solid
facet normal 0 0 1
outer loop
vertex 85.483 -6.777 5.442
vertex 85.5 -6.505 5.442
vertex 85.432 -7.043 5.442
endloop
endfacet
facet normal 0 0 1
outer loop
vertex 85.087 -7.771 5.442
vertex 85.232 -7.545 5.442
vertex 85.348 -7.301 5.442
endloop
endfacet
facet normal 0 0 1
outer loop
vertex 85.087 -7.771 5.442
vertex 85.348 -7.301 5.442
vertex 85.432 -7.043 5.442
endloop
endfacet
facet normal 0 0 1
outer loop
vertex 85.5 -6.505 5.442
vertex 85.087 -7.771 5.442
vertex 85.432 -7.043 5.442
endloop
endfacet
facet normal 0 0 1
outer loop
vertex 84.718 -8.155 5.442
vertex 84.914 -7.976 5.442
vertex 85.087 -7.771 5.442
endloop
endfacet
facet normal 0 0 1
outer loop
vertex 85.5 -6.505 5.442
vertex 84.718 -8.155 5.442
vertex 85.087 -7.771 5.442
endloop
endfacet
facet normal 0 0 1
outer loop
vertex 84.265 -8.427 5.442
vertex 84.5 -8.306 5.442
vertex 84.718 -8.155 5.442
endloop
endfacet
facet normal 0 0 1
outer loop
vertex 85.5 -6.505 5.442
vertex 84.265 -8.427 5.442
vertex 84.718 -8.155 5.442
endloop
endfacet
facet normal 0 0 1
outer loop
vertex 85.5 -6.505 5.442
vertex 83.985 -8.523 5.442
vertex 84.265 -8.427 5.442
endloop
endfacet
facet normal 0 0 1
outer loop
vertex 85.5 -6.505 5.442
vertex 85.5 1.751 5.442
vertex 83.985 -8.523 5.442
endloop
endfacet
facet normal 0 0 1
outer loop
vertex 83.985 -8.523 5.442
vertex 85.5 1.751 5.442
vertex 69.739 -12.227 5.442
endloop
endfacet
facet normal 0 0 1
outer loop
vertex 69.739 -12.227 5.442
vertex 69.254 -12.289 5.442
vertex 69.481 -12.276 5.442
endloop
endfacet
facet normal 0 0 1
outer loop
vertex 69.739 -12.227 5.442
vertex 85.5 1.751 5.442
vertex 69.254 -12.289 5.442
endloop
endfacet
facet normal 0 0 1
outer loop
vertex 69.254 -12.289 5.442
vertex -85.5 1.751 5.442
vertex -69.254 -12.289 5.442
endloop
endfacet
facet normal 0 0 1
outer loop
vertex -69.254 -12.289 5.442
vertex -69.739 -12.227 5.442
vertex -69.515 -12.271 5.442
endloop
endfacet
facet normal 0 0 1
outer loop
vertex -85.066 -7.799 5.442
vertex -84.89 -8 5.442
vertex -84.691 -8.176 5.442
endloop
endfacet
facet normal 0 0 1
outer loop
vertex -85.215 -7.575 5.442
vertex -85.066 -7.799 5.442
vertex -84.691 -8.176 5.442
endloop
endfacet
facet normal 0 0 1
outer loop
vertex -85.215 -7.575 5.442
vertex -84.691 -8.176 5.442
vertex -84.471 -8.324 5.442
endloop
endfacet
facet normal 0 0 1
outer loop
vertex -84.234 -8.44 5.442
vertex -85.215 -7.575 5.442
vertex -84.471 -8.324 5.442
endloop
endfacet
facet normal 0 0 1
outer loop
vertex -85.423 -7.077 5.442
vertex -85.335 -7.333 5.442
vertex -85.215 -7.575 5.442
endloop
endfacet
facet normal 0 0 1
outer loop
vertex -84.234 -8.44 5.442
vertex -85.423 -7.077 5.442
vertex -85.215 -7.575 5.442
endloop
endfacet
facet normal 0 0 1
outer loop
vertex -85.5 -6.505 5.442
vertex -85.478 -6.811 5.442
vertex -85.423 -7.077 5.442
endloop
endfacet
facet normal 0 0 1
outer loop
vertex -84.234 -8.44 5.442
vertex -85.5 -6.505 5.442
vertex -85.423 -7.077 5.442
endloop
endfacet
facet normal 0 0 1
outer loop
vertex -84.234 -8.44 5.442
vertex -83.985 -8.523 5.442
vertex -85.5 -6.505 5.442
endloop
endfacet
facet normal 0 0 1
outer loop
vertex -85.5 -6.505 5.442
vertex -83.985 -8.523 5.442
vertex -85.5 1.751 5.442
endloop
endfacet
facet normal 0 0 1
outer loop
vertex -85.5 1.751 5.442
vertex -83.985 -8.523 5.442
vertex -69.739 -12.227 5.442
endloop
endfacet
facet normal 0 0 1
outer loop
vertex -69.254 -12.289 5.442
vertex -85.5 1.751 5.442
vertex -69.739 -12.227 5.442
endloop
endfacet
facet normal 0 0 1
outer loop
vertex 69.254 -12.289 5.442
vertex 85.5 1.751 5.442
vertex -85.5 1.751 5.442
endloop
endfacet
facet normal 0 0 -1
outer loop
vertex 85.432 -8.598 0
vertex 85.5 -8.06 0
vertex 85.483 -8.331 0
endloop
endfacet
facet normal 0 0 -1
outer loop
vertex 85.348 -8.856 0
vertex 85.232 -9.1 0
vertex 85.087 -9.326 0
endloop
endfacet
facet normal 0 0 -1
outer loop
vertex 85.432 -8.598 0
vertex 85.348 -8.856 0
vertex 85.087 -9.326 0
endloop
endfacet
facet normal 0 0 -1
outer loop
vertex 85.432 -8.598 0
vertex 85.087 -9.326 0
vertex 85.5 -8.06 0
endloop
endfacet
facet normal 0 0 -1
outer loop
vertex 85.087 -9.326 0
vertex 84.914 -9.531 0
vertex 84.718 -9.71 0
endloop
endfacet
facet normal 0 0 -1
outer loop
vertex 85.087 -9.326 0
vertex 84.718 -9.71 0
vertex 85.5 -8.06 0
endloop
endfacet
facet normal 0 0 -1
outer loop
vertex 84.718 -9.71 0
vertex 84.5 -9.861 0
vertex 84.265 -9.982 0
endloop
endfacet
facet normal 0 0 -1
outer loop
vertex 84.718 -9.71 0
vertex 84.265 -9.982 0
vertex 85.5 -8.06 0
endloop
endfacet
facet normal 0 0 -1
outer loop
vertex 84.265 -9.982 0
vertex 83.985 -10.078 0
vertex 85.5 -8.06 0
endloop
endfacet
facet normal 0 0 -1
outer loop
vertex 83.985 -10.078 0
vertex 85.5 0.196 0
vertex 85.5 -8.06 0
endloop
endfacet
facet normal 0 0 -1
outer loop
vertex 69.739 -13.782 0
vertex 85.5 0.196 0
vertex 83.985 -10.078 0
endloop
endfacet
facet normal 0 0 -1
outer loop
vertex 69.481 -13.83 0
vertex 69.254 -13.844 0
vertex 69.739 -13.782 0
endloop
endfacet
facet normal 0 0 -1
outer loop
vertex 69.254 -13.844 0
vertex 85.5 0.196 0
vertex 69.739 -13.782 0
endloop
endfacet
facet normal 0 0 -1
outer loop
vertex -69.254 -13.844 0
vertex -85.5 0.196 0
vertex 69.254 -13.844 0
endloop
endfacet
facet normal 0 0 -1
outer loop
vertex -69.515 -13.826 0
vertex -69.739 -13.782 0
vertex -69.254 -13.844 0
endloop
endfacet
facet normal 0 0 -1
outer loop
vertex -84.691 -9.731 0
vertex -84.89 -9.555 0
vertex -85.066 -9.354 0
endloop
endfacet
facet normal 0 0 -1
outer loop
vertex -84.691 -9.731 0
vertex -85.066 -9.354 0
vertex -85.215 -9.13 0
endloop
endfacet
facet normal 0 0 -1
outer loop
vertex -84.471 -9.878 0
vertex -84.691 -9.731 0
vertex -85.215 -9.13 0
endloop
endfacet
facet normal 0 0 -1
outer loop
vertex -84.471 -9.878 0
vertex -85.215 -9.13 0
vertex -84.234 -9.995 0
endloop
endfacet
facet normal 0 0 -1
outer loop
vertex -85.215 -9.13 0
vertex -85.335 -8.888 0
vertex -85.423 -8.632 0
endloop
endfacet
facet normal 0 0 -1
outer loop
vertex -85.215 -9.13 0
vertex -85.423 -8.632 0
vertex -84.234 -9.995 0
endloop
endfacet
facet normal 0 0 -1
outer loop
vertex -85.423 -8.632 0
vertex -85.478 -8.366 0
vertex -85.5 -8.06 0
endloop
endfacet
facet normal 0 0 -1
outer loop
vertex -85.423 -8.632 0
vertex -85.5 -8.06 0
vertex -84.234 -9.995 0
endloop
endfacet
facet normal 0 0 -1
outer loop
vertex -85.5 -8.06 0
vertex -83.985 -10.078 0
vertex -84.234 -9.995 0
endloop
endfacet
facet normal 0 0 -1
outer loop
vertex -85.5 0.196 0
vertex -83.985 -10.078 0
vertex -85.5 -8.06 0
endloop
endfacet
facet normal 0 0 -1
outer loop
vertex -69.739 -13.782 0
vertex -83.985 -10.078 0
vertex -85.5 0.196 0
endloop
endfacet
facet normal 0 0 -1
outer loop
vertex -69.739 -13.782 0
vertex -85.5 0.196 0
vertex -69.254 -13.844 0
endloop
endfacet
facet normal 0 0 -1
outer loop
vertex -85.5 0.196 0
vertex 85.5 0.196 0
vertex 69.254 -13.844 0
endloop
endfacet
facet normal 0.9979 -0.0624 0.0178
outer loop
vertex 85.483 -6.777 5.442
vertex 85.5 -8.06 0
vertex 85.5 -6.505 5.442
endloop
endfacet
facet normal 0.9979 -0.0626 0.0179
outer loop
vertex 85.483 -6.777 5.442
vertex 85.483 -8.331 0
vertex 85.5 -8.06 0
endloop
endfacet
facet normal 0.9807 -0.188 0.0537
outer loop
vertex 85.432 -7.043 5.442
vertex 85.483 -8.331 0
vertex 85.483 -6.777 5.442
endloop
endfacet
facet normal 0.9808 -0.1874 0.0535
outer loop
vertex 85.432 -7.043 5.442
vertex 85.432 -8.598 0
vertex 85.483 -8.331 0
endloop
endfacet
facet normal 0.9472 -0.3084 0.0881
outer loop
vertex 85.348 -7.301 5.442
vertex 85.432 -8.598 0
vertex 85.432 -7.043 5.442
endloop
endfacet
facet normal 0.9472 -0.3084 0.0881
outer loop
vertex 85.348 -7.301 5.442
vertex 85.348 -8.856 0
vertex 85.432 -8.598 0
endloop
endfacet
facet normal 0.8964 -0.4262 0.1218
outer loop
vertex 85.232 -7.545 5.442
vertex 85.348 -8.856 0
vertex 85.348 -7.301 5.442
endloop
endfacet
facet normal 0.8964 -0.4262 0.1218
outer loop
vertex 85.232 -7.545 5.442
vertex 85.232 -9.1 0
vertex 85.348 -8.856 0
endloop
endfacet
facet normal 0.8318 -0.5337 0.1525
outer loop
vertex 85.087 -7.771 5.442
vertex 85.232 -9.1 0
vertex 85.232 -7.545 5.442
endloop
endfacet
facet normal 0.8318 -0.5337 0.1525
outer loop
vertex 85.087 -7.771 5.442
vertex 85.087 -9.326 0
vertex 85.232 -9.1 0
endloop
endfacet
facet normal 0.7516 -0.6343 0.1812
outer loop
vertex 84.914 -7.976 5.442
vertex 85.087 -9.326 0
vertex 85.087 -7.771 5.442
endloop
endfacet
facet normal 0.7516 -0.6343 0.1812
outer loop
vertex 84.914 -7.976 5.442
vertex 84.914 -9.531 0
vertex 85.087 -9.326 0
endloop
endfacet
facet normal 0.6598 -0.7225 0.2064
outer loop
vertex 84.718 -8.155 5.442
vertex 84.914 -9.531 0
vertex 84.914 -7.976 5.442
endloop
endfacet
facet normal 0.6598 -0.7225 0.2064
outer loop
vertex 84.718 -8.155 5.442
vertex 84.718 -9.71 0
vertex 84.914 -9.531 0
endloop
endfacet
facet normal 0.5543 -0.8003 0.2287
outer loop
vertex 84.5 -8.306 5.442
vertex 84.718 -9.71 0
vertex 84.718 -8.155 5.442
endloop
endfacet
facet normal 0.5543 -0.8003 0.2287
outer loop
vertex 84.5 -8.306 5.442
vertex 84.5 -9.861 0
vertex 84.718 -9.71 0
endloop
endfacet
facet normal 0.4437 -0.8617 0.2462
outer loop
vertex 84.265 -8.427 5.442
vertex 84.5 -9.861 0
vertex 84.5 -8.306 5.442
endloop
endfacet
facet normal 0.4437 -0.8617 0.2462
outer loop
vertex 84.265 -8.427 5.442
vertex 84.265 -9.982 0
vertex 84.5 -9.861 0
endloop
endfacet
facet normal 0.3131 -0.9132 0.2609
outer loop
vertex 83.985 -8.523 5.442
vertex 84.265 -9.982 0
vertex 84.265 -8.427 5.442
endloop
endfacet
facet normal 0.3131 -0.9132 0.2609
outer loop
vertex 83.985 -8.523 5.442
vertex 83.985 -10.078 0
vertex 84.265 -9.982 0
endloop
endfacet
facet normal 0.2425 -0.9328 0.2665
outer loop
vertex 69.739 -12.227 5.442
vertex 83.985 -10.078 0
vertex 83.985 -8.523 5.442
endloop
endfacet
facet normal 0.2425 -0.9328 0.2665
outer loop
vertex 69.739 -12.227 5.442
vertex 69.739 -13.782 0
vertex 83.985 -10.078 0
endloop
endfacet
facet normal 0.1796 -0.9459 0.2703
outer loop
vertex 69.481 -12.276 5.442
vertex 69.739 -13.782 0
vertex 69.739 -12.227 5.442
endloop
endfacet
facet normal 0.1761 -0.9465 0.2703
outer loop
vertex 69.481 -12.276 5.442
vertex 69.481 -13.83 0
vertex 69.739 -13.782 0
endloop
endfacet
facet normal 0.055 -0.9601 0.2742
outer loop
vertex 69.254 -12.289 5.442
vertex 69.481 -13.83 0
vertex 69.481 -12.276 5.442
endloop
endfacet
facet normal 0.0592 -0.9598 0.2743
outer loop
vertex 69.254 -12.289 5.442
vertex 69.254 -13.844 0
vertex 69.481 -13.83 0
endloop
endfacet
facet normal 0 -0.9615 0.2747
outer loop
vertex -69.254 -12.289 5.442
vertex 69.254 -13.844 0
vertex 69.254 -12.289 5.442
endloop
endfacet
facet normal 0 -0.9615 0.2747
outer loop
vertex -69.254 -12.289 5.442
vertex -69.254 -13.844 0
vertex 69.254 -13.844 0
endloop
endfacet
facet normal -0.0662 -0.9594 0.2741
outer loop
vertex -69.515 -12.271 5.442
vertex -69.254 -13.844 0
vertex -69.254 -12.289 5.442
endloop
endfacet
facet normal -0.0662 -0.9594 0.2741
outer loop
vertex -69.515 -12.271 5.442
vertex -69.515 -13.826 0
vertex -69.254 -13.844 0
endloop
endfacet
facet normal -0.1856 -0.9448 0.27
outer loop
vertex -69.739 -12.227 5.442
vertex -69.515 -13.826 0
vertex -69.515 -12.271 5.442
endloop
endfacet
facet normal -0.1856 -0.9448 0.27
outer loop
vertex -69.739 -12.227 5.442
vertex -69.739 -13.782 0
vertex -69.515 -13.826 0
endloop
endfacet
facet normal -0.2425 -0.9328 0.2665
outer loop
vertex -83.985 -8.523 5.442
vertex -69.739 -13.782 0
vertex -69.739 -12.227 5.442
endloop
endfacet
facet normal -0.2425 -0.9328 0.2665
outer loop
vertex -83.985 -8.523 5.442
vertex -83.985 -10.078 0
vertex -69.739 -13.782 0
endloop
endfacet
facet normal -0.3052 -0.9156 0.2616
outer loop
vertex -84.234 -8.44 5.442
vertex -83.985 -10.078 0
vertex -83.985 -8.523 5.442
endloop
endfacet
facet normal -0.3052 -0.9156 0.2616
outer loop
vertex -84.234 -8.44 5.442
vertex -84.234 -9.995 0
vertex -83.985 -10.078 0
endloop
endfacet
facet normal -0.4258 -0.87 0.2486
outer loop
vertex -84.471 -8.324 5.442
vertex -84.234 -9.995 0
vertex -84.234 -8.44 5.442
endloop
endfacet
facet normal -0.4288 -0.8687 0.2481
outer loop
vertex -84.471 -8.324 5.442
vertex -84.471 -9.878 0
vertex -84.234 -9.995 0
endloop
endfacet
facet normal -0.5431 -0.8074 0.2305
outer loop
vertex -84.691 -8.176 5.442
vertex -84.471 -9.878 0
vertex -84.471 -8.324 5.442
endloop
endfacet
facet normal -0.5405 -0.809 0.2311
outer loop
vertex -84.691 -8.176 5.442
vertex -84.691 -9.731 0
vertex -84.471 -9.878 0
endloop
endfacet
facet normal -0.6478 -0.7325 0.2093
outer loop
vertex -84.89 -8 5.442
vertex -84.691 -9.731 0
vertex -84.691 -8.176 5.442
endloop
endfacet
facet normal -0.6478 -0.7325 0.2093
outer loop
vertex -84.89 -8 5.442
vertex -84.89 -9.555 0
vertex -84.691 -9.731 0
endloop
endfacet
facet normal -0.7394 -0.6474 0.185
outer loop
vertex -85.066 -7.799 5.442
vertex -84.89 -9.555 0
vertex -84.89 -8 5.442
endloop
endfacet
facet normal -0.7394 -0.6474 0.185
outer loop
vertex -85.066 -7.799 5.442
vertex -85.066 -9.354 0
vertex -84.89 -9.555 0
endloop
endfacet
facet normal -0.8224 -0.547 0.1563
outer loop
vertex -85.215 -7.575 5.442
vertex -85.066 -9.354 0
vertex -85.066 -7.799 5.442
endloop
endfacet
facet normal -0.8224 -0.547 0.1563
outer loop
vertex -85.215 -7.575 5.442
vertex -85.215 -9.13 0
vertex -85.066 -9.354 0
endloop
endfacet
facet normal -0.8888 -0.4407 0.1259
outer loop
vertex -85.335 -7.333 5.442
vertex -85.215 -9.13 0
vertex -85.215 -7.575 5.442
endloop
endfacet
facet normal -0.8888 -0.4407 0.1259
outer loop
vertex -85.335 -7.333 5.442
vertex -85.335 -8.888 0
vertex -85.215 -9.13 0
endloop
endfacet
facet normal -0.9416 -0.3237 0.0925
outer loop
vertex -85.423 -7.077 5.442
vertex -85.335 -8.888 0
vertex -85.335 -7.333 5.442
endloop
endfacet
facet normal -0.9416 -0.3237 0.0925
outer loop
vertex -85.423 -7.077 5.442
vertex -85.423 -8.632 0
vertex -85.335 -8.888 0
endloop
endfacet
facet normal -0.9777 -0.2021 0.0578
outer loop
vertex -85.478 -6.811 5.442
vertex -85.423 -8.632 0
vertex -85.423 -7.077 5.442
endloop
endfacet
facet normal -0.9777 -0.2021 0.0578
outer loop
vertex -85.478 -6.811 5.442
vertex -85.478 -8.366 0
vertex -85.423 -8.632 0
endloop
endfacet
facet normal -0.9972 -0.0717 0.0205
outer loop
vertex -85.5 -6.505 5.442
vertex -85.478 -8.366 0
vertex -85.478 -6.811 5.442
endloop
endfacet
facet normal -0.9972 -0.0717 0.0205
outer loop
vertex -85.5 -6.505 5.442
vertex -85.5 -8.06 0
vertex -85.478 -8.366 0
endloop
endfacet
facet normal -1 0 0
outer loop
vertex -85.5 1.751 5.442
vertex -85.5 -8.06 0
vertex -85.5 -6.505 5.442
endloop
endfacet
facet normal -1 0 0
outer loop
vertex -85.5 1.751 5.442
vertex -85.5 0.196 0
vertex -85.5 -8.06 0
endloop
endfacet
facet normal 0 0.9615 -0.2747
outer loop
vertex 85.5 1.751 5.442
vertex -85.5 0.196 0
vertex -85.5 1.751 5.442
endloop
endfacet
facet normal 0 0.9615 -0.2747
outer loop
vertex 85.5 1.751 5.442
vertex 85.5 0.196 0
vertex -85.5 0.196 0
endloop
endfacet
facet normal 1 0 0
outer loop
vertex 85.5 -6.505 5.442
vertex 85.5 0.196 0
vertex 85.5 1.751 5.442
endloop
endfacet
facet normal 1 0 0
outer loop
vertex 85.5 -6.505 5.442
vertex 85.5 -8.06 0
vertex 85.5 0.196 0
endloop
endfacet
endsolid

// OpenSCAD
// ROG Bulwark Dock (DG310) back-wall shim for the 2023 ROG Ally (RC71L)
// The DG310 cradle is sized for the thicker 2025 model. This shim lines the
// cradle's back wall so the thinner RC71L sits snugly and stays upright.
//
// Coordinates: X = left/right (centered), Y = front/back (0 = bare back wall
// at floor level, +Y toward the front), Z = up.
// Measurements are entered as taken with the pad in place. Widths are to the
// bare plastic; depths from the back wall and heights from the floor are to
// the pad surface. The bare-plastic sizes are worked out below.
// Print orientation: by default the shim is exported lying flat on its back
// face, ready to print. Set print_flat = false to see it as it sits in the dock.

/* [Cradle] */
back_width    = 174;  // width of the back wall at the floor
floor_depth   = 28;   // padded back wall to padded front edge, at floor level

/* [Cradle back wall (front view)] */
wall_h_center = 14;   // wall height in the middle, from the padded floor
wall_h_end    = 10;   // wall height at the ends, from the padded floor
wall_chamfer  = 16;   // horizontal length of the corner slopes
wall_lean     = 4;    // how far the top of the wall leans back over its height
wall_corner_r = 2;    // radius of the rounded top corners (0 = sharp). Bigger is safe.

/* [Pad] */
// The sticky pad lines the cradle (floor, back, front and sides). The back
// pad is a separate piece: it can stay on the wall, or move to the shim's
// front face. Either way it takes up the same space, so the shim is the same.
pad_thickness = 1;

/* [Device] */
ally_depth = 21;      // RC71L thickness where it sits in the cradle

/* [Fit] */
clearance      = 0.5; // gap left at the ends and top so it drops in
fit_gap        = 0.5; // extra front-to-back room for the Ally
liner_override = 0;   // set >0 to force a shim thickness (mm)

/* [Output] */
print_flat = true;    // true = lying on its back face for printing

/* [Hidden] */
$fn = 48;
tilt  = wall_lean / wall_h_center;      // horizontal shift per mm of height
theta = atan(tilt);

// Bare-plastic sizes (measurements above were taken with the pad in place)
depth_bare = floor_depth + 2 * pad_thickness;  // back + front pads
h_ctr_bare = wall_h_center + pad_thickness;    // floor pad
h_end_bare = wall_h_end + pad_thickness;       // floor pad

// Floor, side and front pads stay in the cradle
pad_in = pad_thickness;

// Horizontal footprint of a leaning device of thickness ally_depth
ally_footprint = ally_depth / cos(theta);

// Depth to fill = bare floor depth
//   - back pad (on the wall or on the shim face)
//   - front lip pad
//   - the Ally and its fit gap
liner_t = liner_override > 0 ? liner_override
        : depth_bare - 2 * pad_thickness - ally_footprint - fit_gap;

echo(str("Wall lean angle: ", theta, " deg"));
echo(str("Shim thickness: ", liner_t, " mm"));
assert(liner_t > 0.8, "Shim too thin - check measurements");

// ---- Front-view profile of the back wall, inset by clearance + pad ----
module wall_profile() {
    w  = back_width - 2*(clearance + pad_in);
    // the shim sits on the floor pad, so trim its height to match
    hc = h_ctr_bare - clearance - pad_in;
    he = h_end_bare - clearance - pad_in;
    r  = wall_corner_r;
    // Round the convex corners (offset in, then back out by r). The shape is
    // extended below z=0 first and trimmed after, so only the top corners
    // get rounded and the bottom edge stays square.
    intersection() {
        offset(r = r) offset(delta = -r)
            polygon([
                [-w/2, -r - 1], [w/2, -r - 1],
                [ w/2, he], [ w/2 - wall_chamfer, hc],
                [-w/2 + wall_chamfer, hc], [-w/2, he]
            ]);
        translate([-w/2, 0]) square([w, hc]);
    }
}

// ---- Shim: profile extruded forward, sheared to follow the wall's lean ----
module shim() {
    // Back face shown against the back-wall pad. Since the shim sits on the
    // floor pad, the leaning wall is slightly further back at its base.
    // (With the pad moved to the shim, it simply sits 1mm further back.)
    y0 = pad_in - tilt * pad_in;
    // shear: y shifts back by `tilt` per mm of z
    multmatrix([[1, 0, 0,     0],
                [0, 1, -tilt, y0],
                [0, 0, 1,     0]])
        // profile lives in XZ; extrude along +Y by shim thickness
        rotate([90, 0, 0]) translate([0, 0, -liner_t])
            linear_extrude(liner_t) wall_profile();
}

// Lay flat: rotate about X until the back face points straight down, then
// drop that face onto the bed (z = 0).
module print_ready() {
    y0 = pad_in - tilt * pad_in;
    a  = 90 - theta;
    translate([0, 0, -y0 * sin(a)]) rotate([a, 0, 0]) shim();
}

if (print_flat) print_ready(); else shim();
